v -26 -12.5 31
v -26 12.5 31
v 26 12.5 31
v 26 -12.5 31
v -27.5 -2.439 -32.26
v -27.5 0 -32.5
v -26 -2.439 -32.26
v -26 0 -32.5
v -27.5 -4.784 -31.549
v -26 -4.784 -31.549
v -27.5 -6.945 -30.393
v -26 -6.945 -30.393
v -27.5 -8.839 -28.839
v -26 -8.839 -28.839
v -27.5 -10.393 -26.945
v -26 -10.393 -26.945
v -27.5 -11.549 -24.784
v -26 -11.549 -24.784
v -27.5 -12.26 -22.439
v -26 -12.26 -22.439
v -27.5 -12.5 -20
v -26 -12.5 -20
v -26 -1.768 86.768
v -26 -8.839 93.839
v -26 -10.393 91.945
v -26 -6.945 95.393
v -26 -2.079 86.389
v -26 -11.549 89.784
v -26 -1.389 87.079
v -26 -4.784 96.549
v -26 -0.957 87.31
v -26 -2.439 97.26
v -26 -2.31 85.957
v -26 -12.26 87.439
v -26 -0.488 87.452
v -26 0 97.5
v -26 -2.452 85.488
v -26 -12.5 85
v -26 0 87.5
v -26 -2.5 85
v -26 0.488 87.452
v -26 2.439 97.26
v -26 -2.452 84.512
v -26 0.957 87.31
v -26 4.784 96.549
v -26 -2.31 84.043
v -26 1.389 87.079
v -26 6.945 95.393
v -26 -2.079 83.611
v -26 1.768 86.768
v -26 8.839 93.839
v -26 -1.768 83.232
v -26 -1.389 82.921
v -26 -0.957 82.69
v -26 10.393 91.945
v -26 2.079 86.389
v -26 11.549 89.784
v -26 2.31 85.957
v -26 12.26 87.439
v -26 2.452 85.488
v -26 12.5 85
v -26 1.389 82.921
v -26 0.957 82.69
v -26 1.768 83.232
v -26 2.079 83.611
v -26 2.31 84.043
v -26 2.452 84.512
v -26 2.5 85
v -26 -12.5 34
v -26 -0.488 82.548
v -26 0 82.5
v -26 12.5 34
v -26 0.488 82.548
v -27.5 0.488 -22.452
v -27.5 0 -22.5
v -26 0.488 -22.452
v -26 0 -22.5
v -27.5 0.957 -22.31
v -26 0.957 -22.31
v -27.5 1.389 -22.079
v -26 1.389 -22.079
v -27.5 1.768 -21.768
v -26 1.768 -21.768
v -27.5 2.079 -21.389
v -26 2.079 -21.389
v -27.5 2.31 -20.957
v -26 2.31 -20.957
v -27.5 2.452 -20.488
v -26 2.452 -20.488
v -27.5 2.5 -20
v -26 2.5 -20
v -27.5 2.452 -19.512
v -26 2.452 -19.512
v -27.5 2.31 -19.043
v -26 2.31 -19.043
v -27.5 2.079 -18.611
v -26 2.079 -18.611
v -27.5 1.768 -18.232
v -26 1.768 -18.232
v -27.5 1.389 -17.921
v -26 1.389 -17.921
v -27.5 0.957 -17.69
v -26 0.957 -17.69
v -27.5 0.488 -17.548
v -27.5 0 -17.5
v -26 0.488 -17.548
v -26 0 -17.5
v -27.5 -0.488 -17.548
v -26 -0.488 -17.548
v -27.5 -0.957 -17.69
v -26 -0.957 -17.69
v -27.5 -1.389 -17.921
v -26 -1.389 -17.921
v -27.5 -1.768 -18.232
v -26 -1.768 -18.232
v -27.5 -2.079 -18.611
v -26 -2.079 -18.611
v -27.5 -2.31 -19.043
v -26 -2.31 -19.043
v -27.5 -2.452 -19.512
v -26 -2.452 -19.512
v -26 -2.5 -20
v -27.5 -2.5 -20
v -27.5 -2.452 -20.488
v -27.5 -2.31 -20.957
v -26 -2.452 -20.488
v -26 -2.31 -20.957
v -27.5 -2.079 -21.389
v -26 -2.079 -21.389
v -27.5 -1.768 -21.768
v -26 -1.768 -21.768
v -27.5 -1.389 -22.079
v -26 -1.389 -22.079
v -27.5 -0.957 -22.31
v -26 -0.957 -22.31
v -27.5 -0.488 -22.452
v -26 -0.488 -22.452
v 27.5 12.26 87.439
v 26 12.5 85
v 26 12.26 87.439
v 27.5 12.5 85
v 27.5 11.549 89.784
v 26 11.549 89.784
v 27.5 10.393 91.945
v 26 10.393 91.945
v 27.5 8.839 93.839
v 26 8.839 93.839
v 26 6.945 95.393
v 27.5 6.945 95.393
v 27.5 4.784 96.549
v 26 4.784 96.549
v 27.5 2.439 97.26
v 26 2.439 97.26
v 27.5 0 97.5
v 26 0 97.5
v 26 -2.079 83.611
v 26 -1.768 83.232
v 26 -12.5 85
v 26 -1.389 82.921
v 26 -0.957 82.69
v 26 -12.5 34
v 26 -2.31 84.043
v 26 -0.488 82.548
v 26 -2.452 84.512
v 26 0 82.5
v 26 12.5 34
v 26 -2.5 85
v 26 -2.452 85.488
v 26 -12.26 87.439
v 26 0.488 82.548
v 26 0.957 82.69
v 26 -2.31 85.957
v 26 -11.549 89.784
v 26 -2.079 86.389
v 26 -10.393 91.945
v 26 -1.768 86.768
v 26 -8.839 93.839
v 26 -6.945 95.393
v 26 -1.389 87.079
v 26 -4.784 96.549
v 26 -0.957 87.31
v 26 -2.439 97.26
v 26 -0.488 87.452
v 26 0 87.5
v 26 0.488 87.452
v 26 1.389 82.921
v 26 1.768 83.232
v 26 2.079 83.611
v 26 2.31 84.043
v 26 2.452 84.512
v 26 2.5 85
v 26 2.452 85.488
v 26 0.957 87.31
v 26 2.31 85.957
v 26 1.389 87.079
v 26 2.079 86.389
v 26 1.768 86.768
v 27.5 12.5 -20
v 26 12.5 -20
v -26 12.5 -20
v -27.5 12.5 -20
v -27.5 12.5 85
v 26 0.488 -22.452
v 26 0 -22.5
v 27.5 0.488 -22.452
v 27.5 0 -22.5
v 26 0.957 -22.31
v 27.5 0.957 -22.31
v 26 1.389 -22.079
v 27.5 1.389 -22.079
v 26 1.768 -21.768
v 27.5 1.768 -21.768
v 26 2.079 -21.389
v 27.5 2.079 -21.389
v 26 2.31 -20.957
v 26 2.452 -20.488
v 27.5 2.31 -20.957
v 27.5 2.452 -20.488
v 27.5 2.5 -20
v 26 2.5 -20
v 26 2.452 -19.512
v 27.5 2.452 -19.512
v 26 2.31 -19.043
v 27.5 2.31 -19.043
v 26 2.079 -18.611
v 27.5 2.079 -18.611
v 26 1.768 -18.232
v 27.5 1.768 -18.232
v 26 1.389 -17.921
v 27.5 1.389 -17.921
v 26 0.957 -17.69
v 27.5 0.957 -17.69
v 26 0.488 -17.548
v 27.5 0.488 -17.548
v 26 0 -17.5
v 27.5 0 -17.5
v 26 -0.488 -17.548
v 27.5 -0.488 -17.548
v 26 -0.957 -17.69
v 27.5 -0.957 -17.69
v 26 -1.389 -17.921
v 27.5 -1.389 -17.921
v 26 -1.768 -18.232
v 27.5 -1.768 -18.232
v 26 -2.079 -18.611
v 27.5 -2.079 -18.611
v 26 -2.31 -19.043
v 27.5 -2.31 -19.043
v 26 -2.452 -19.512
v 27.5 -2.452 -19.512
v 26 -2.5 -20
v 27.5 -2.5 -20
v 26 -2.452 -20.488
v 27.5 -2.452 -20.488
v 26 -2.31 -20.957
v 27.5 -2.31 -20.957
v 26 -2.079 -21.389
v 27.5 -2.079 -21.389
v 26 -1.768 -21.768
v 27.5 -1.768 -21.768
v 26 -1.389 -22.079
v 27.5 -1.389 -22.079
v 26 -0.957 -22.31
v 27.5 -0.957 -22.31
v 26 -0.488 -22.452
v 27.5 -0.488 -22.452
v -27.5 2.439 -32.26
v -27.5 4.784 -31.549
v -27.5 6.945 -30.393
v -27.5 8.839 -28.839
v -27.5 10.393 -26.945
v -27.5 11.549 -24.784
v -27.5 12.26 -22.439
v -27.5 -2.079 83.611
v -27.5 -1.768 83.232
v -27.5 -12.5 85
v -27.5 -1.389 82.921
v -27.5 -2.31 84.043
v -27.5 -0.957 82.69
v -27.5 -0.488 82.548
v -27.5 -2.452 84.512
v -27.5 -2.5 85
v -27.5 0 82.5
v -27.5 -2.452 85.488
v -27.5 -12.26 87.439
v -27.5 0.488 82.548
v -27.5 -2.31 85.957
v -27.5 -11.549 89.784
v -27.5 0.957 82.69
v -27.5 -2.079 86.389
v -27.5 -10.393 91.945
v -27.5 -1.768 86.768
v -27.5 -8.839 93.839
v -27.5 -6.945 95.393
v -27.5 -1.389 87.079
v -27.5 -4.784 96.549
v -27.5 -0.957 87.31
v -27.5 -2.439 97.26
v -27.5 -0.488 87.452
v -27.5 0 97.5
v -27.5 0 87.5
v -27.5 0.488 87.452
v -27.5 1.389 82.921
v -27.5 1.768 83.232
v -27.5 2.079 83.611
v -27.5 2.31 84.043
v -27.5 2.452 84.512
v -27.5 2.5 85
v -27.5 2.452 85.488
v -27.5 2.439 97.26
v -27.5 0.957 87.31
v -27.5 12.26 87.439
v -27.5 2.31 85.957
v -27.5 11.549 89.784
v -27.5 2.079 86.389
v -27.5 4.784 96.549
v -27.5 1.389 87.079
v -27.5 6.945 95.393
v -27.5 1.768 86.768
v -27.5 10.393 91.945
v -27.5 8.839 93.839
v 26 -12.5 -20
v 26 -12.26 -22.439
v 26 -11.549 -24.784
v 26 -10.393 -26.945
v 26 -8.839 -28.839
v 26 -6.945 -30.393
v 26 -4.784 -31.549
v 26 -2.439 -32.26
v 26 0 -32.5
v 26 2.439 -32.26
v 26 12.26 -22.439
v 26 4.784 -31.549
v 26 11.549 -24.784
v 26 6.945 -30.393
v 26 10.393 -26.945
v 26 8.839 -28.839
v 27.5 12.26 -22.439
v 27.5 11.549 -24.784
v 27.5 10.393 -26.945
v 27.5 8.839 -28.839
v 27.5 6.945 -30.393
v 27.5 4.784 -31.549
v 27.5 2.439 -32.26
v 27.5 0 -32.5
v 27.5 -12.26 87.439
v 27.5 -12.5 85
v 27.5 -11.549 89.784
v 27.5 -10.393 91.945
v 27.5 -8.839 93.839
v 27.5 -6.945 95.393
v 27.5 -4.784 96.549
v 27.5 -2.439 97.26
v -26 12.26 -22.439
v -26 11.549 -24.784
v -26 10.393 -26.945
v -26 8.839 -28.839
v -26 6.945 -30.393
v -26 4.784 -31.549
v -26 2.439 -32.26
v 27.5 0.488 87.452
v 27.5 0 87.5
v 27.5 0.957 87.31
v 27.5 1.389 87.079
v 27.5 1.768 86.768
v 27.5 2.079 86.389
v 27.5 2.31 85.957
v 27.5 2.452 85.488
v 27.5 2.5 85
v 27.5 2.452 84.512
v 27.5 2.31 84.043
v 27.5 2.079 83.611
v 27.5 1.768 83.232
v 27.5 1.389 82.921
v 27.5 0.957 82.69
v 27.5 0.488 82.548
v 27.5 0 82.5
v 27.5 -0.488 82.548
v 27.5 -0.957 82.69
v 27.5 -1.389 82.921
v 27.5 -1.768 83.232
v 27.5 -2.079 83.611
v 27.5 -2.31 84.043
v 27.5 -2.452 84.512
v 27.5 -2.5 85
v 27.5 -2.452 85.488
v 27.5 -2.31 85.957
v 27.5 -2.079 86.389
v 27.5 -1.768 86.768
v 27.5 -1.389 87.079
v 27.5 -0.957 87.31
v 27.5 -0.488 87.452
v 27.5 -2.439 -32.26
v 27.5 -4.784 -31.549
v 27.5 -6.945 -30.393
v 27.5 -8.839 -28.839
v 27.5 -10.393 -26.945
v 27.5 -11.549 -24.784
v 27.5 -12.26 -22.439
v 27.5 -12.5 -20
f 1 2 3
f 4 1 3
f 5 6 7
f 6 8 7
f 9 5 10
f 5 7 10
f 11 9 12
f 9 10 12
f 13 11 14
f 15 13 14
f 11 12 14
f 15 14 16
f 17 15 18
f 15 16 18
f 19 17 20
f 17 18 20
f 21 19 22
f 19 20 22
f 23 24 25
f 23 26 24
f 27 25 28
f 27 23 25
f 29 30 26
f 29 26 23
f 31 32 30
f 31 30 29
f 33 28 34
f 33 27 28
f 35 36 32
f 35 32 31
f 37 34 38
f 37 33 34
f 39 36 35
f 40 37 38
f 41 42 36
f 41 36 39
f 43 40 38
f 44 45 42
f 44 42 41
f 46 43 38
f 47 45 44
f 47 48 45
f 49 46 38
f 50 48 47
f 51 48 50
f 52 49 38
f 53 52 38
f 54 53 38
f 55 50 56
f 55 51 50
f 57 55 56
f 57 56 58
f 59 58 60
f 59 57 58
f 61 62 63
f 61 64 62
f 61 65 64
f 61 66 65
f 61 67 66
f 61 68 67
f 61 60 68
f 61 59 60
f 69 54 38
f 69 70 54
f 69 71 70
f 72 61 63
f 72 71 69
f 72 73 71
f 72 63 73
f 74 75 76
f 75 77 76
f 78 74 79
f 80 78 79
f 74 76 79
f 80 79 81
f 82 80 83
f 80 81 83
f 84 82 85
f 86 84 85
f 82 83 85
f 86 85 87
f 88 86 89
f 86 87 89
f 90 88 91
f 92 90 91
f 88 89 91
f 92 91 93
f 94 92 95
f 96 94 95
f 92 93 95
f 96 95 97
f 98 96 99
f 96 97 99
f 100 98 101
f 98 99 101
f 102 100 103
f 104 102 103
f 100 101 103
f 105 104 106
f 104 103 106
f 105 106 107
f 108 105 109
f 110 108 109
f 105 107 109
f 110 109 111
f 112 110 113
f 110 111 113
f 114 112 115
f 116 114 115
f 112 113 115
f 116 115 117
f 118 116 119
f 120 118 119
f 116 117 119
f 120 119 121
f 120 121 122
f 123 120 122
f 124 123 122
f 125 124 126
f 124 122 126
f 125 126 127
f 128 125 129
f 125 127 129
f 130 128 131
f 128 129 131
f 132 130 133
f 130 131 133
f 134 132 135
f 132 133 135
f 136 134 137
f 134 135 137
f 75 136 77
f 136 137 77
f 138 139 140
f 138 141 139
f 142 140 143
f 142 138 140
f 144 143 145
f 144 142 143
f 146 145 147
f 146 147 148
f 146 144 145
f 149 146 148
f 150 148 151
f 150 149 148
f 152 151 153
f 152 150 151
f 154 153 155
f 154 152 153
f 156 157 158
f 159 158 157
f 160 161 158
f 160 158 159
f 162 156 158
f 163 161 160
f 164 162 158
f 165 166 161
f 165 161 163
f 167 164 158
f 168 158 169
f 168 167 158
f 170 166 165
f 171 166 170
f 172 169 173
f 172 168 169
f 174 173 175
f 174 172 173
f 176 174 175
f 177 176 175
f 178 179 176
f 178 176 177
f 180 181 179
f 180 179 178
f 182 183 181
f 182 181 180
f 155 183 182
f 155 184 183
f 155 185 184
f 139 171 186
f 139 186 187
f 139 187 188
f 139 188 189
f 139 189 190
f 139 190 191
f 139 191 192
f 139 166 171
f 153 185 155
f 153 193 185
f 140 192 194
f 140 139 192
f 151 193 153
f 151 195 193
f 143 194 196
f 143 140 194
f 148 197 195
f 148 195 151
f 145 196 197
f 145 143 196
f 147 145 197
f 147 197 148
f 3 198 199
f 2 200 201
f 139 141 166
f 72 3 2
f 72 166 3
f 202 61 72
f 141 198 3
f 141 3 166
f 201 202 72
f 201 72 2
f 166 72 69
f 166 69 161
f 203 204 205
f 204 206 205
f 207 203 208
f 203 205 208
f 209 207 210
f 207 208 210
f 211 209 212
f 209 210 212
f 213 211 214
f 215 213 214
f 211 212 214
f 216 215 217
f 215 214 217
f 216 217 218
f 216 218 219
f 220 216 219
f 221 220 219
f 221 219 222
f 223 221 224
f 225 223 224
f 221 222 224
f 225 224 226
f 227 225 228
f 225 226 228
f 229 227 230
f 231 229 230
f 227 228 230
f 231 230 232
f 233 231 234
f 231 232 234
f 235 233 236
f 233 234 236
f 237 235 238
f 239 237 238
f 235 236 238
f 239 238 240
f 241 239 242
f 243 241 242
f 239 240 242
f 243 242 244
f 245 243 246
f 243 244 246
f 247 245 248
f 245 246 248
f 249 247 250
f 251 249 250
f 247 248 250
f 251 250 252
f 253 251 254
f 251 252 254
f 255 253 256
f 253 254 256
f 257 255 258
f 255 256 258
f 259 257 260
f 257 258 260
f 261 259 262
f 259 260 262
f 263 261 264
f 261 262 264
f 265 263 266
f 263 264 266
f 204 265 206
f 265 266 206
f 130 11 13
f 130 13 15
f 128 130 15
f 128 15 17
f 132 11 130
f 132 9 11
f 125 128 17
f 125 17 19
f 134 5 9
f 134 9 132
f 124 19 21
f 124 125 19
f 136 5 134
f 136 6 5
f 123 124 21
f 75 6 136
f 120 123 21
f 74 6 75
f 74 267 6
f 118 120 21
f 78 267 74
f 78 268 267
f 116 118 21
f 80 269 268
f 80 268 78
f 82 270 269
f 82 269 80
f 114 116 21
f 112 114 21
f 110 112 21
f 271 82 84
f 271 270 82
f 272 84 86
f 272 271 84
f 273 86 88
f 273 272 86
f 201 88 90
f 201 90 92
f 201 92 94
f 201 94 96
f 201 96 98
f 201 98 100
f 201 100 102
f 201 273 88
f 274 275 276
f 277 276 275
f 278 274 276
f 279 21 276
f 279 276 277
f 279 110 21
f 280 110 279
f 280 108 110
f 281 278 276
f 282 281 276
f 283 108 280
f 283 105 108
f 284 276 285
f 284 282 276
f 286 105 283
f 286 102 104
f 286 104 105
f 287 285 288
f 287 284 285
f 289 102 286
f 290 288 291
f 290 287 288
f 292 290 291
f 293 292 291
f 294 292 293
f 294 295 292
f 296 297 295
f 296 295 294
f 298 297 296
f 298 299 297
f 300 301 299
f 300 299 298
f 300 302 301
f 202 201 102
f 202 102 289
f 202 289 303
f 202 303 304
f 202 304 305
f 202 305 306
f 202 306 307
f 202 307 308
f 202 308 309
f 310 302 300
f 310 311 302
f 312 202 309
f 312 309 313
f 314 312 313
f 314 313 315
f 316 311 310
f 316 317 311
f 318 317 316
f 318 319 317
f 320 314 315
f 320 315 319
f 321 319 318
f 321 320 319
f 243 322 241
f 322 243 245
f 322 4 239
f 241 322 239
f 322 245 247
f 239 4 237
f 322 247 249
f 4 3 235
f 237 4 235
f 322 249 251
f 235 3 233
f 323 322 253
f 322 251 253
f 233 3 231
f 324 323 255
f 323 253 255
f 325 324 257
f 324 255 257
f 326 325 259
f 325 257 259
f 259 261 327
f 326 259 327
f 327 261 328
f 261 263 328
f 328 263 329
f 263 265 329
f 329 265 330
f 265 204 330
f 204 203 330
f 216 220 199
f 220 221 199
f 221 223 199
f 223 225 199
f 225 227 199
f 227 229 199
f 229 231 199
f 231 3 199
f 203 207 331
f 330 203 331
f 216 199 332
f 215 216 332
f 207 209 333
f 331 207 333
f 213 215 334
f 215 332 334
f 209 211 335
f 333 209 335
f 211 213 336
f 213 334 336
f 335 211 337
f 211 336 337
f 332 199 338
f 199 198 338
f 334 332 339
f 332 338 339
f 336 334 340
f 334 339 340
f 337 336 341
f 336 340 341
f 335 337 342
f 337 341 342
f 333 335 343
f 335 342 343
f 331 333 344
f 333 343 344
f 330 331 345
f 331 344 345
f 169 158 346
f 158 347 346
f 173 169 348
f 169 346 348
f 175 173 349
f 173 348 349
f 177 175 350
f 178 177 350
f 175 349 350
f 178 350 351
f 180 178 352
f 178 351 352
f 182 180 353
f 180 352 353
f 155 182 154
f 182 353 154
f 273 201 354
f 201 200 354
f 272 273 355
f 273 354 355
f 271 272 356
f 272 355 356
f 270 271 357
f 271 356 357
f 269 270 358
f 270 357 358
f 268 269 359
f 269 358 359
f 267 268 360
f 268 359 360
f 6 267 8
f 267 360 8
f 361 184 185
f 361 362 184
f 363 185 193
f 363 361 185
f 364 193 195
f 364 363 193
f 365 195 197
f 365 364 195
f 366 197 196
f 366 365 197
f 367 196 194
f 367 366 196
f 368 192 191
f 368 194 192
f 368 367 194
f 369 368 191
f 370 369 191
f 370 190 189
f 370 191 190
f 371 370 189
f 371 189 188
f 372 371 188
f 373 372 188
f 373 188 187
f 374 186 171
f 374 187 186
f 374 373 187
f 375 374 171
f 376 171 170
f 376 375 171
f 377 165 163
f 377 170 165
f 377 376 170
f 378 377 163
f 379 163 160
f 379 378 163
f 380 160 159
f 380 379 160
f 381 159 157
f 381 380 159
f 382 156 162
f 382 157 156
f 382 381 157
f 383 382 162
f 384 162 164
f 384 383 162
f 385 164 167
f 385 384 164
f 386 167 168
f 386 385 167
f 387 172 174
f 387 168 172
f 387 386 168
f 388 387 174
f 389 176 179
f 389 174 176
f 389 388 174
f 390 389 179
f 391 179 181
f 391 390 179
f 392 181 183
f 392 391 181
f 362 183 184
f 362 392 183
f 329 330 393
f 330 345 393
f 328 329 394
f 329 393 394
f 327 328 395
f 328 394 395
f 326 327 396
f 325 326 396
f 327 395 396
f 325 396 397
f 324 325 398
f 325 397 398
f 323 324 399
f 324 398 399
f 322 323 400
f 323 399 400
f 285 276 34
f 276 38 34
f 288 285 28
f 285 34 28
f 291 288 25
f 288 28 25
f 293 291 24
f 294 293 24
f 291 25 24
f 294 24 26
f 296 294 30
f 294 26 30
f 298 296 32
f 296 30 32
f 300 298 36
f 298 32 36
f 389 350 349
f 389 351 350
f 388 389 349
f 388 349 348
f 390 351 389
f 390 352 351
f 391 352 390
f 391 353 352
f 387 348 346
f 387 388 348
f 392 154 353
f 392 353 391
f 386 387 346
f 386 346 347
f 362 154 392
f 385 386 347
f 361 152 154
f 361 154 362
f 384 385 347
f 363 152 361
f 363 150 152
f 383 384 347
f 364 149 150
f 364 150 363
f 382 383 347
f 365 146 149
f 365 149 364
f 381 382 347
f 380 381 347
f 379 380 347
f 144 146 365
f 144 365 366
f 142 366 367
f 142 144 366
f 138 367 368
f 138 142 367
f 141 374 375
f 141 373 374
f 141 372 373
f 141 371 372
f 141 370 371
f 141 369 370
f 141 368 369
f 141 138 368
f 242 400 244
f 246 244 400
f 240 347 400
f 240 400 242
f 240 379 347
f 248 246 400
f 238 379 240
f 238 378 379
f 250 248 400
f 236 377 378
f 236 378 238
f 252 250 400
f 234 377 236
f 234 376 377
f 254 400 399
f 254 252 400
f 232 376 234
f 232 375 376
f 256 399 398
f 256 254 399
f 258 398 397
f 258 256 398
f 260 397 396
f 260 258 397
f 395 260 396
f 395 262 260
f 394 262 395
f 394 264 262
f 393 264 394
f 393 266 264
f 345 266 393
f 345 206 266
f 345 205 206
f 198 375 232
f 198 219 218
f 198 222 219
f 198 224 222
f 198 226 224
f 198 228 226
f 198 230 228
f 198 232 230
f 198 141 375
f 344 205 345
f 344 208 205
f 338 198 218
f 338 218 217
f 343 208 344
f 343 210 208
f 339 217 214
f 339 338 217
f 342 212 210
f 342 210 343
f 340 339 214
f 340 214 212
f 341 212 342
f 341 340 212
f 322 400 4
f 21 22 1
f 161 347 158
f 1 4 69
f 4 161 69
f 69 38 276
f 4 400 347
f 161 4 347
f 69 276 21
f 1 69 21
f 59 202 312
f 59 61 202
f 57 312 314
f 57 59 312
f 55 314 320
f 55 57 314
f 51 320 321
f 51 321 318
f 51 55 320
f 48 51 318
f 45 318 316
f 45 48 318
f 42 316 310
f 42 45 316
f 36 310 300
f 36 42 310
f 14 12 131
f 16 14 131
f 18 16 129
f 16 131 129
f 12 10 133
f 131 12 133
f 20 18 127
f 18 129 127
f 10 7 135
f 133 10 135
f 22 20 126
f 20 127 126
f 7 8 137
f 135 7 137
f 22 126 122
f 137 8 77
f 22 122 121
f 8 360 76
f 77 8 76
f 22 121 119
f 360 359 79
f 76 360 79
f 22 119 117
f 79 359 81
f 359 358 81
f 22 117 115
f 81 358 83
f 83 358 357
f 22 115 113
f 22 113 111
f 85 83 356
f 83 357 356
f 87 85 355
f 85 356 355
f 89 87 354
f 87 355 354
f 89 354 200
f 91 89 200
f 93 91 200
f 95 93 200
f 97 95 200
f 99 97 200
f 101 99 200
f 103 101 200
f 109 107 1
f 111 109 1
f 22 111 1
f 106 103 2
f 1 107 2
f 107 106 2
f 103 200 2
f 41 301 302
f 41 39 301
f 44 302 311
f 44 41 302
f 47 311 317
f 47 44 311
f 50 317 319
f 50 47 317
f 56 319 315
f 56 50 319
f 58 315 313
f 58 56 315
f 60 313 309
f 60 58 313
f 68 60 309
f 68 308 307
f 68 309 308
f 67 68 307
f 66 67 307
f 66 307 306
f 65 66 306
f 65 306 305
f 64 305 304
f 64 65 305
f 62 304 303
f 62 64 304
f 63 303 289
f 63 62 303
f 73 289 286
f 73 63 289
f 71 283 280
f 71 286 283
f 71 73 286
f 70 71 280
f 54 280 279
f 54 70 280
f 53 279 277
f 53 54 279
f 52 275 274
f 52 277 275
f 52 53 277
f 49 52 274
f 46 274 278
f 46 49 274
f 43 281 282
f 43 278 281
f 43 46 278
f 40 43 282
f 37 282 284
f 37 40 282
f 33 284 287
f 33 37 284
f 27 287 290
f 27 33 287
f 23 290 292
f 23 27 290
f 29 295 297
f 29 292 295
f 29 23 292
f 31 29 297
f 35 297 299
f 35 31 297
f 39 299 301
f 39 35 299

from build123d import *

# Parameters (mm, degrees)
BOSS_EXTRUDE1_DEPTH  = 12.5
FILLET1_R            = 12.5
SKETCH2_R            = 2.5
CUT_EXTRUDE1_DEPTH   = 45.370598373
FILLET1_OF_MIRROR1_R = 12.5


with BuildPart() as part:
    # Sketch1 → Boss-Extrude1 (new, symmetric)
    with BuildSketch(Plane(origin=(0, 0, 0), x_dir=(1, 0, 0), z_dir=(0, 1, 0))):
        Polygon((26, -31), (26, 32.5), (27.5, 32.5), (27.5, -32.5), (-27.5, -32.5), (-27.5, 32.5), (-26, 32.5), (-26, -31), align=None)
    boss_extrude1 = extrude(amount=BOSS_EXTRUDE1_DEPTH, both=True)

    # Fillet1
    fillet1_edges = [part.edges().sort_by_distance(p)[0] for p in [
        (-26.75, -12.5, -32.5),
        (-26.75, 12.5, -32.5),
        (26.75, -12.5, -32.5),
        (26.75, 12.5, -32.5),
    ]]
    fillet(fillet1_edges, radius=FILLET1_R - 0.0001)  # a hair under: the kernel refuses the full size

    # Sketch2 → Cut-Extrude1 (cut, symmetric)
    with BuildSketch(Plane(origin=(0, 0, 0), x_dir=(0, 0, -1), z_dir=(1, 0, 0))):
        with Locations((20, 0)):
            Circle(SKETCH2_R)
    cut_extrude1 = extrude(amount=CUT_EXTRUDE1_DEPTH, both=True, mode=Mode.SUBTRACT)

    # Mirror1: Boss-Extrude1, Cut-Extrude1 across plane
    add(boss_extrude1.mirror(Plane(origin=(27.5, 12.5, 32.5), x_dir=(1, 0, 0), z_dir=(0, 0, -1))))
    add(cut_extrude1.mirror(Plane(origin=(27.5, 12.5, 32.5), x_dir=(1, 0, 0), z_dir=(0, 0, -1))), mode=Mode.SUBTRACT)

    # Fillet1 of Mirror1
    fillet1_of_mirror1_edges = [part.edges().sort_by_distance(p)[0] for p in [
        (-26.75, -12.5, 97.5),
        (-26.75, 12.5, 97.5),
        (26.75, -12.5, 97.5),
        (26.75, 12.5, 97.5),
    ]]
    fillet(fillet1_of_mirror1_edges, radius=FILLET1_OF_MIRROR1_R - 0.0001)  # a hair under: the kernel refuses the full size


solid = part.part
